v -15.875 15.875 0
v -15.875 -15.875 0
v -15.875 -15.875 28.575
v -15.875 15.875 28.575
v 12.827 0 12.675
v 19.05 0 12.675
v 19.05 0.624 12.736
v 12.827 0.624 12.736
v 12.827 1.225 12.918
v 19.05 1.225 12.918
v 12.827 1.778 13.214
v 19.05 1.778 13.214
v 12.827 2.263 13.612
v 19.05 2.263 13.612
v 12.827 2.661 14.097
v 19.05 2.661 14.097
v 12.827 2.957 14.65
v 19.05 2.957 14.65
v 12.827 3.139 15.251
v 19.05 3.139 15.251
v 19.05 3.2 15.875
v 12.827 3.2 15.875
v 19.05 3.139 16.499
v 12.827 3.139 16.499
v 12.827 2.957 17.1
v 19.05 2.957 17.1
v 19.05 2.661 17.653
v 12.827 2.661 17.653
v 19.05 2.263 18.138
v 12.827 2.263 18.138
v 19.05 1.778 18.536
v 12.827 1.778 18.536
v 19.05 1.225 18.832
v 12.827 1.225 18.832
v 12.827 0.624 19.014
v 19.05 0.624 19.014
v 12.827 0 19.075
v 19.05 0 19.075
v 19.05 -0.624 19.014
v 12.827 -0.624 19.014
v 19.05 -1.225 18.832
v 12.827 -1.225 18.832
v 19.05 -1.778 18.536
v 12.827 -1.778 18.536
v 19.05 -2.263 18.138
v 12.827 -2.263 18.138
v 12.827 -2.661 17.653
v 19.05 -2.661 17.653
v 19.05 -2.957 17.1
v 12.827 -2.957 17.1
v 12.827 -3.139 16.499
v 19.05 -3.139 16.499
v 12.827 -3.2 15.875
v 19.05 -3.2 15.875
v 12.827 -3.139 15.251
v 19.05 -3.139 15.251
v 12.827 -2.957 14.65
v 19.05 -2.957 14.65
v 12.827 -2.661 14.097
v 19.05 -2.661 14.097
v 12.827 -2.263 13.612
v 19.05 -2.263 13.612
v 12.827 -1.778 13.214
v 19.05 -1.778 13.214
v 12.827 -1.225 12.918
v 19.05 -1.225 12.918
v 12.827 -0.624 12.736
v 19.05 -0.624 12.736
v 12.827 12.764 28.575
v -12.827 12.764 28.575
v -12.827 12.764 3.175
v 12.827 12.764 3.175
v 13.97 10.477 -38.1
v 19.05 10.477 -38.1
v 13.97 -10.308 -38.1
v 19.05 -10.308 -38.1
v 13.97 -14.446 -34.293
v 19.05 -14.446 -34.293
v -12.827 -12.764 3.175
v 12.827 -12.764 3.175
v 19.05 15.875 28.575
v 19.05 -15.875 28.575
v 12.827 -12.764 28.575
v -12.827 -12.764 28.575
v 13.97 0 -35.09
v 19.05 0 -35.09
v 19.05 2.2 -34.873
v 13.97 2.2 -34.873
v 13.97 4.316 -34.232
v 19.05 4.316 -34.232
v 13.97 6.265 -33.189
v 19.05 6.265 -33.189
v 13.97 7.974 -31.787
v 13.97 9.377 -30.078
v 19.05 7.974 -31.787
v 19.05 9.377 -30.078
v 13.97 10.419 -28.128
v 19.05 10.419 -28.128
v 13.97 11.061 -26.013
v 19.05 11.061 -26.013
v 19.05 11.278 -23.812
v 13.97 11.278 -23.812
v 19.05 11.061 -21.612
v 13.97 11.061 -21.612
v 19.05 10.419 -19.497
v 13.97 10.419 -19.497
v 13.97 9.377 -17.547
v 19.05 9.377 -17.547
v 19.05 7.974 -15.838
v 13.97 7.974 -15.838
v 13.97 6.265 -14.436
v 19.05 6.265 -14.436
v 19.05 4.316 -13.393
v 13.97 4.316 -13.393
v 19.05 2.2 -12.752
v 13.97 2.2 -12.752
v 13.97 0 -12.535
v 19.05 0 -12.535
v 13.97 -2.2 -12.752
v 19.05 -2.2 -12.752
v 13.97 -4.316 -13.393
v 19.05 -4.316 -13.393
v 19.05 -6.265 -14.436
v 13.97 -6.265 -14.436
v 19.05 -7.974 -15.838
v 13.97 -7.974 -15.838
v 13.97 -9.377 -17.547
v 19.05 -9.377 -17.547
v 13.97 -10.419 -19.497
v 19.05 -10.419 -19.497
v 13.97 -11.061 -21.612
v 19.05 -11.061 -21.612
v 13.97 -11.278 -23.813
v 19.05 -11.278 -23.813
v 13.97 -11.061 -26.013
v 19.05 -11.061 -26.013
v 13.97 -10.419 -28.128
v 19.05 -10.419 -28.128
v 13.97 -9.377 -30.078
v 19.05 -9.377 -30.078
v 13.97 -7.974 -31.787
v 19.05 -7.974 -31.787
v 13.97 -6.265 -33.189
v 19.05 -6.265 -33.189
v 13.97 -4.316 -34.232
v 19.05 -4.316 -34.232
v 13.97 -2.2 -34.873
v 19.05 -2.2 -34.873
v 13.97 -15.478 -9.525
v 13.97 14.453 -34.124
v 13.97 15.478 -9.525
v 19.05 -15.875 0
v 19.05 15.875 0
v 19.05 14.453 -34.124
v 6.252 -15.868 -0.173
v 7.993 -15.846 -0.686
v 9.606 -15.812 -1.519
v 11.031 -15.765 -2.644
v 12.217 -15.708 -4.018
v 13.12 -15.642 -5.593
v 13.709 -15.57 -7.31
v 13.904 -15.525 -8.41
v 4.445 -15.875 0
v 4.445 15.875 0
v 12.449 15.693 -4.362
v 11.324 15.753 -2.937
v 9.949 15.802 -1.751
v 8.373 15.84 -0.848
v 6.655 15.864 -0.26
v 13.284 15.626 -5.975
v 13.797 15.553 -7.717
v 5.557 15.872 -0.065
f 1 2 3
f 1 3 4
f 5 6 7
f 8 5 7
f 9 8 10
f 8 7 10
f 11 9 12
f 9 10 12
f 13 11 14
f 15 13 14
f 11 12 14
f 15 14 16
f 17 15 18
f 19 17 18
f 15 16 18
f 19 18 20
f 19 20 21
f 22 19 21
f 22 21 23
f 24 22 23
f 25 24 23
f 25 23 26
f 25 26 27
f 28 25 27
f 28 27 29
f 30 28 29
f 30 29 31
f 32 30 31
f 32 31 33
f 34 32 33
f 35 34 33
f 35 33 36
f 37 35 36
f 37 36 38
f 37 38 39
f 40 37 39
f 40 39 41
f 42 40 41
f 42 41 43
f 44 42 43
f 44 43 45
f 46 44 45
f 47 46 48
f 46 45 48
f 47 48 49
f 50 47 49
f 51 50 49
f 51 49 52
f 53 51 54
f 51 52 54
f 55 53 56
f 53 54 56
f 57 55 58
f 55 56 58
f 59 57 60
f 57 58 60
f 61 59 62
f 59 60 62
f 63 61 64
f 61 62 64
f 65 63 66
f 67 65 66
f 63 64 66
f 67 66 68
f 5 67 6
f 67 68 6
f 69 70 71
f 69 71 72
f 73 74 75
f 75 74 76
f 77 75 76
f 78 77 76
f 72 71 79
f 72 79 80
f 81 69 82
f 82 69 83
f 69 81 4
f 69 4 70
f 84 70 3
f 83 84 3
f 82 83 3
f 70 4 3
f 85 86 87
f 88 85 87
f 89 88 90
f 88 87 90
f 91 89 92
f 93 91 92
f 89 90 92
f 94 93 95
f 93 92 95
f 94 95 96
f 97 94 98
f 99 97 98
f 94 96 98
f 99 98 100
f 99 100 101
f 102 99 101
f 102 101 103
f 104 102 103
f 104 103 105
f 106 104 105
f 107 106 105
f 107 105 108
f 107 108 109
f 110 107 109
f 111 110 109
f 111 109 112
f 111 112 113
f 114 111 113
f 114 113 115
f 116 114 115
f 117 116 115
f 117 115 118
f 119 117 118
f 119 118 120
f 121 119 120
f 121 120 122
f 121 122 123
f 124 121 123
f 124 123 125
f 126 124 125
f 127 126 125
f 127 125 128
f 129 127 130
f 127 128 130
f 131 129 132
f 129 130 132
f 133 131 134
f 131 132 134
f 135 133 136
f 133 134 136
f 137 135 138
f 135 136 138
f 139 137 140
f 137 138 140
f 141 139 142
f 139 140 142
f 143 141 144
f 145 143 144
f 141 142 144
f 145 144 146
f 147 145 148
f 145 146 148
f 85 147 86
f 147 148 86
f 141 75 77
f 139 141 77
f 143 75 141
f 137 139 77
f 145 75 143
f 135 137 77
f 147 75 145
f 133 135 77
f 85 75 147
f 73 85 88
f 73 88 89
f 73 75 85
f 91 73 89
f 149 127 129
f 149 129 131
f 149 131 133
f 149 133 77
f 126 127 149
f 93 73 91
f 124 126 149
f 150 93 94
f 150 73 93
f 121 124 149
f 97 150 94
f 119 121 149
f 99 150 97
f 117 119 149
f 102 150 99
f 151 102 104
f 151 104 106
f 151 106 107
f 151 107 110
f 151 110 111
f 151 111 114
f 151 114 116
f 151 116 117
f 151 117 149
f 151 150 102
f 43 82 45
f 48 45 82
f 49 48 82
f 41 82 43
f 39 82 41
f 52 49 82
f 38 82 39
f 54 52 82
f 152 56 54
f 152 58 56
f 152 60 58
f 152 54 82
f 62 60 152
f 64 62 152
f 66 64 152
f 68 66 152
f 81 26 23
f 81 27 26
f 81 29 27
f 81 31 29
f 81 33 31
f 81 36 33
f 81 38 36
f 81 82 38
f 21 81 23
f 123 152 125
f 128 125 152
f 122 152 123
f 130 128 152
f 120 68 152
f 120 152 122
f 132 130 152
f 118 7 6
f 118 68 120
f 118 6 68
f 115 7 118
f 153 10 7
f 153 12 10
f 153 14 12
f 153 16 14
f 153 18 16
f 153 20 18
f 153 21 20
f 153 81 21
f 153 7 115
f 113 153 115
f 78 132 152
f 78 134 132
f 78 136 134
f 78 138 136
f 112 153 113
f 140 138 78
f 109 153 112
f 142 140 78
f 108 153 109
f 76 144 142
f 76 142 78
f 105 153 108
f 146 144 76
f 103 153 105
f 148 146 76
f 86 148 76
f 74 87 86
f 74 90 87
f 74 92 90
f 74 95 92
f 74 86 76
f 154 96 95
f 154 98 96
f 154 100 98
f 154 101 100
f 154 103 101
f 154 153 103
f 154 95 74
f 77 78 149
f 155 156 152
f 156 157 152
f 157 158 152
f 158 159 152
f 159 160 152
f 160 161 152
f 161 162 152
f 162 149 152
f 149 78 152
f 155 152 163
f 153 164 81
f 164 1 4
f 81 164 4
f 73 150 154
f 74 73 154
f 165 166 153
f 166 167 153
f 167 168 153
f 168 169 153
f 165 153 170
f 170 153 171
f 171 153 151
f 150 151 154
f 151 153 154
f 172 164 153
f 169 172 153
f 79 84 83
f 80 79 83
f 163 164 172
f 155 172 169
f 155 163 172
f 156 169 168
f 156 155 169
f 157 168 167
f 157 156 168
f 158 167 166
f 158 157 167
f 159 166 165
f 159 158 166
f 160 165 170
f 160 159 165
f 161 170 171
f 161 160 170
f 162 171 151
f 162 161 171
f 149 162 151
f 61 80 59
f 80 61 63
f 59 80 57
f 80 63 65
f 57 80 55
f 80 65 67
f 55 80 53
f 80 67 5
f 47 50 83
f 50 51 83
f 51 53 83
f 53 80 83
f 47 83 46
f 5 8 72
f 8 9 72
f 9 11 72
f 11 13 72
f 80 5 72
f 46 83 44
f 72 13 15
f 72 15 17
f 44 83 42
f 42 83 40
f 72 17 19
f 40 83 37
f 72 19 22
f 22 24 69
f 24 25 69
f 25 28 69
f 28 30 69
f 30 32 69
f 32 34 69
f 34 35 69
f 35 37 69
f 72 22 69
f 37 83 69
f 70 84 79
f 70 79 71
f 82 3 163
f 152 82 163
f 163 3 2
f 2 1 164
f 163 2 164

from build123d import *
from OCP.BRepFilletAPI import BRepFilletAPI_MakeChamfer

# Parameters (mm, degrees)
SKETCH1_W           = 31.75
SKETCH1_H           = 31.75
BOSS_EXTRUDE1_DEPTH = 28.575
SKETCH2_W           = 25.654
SKETCH2_H           = 25.527
CUT_EXTRUDE1_DEPTH  = 25.4
BOSS_EXTRUDE2_DEPTH = 3.175
BOSS_EXTRUDE3_DEPTH = 1.905
FILLET1_R           = 9.525
CUT_EXTRUDE2_REACH  = 56.068
SKETCH6_R           = 11.2776
SKETCH6_R_2         = 3.2004
CHAMFER1_SIZE       = 3.81
CHAMFER1_SIZE2      = 3.979101764


with BuildPart() as part:
    # Sketch1 → Boss-Extrude1 (new body)
    with BuildSketch(Plane.XY):
        Rectangle(SKETCH1_W, SKETCH1_H)
    extrude(amount=BOSS_EXTRUDE1_DEPTH)

    # Sketch2 → Cut-Extrude1 (cut)
    with BuildSketch(Plane.XY.offset(28.575)):
        Rectangle(SKETCH2_W, SKETCH2_H)
    extrude(amount=-CUT_EXTRUDE1_DEPTH, mode=Mode.SUBTRACT)

    # Sketch4 → Boss-Extrude2 (add)
    with BuildSketch(Plane(origin=(15.875, 0, 0), x_dir=(0, 0, -1), z_dir=(1, 0, 0))):
        Polygon((-28.575, -15.875), (0, -15.875), (38.1, -14.2875), (38.1, 14.2875), (0, 15.875), (-28.575, 15.875), align=None)
    extrude(amount=BOSS_EXTRUDE2_DEPTH)

    # Sketch5 → Boss-Extrude3 (add)
    with BuildSketch(Plane.ZY.offset(-15.875)):
        Polygon((-38.1, -14.2875), (0, -15.875), (0, 15.875), (-38.1, 14.2875), align=None)
    extrude(amount=BOSS_EXTRUDE3_DEPTH)

    # Fillet1
    # the kernel refuses this fillet: 9.525 mm, written as the material it adds along each edge
    with BuildSketch(Plane(origin=(13.97, -15.875, 0), x_dir=(-1, 0, 0), z_dir=(0, 1, 0))) as fillet1_piece_1_section:
        with BuildLine():
            CenterArc((FILLET1_R, -FILLET1_R), FILLET1_R, 90, 90)
            Line((0, -FILLET1_R), (0, 0))
            Line((0, 0), (FILLET1_R, 0))
        make_face()
    fillet1_piece_1 = extrude(amount=31.75, mode=Mode.PRIVATE)
    fillet1_piece_1 = split(fillet1_piece_1, bisect_by=Plane(origin=(11.807061563, -15.758253216, -2.801922808), z_dir=(0, 0.999133073092352, 0.04163054471218078)), keep=Keep.TOP, mode=Mode.PRIVATE)
    fillet1_piece_1 = split(fillet1_piece_1, bisect_by=Plane(origin=(11.807061563, 15.758253216, -2.801922808), z_dir=(0, -0.9991330730923519, 0.041630544712181895)), keep=Keep.TOP, mode=Mode.PRIVATE)
    add(fillet1_piece_1)

    # Sketch6 → Cut-Extrude2 (cut, up to next)
    with BuildSketch(Plane(origin=(19.05, 0, 0), x_dir=(0, 0, -1), z_dir=(1, 0, 0)), mode=Mode.PRIVATE) as cut_extrude2_sk1:
        with Locations((23.8125, 0)):
            Circle(SKETCH6_R)
    cut_extrude2_tool1 = extrude(cut_extrude2_sk1.sketch, amount=-CUT_EXTRUDE2_REACH, mode=Mode.PRIVATE) & part.part
    # Sketch6 → Cut-Extrude2 (cut, up to next)
    with BuildSketch(Plane(origin=(19.05, 0, 0), x_dir=(0, 0, -1), z_dir=(1, 0, 0)), mode=Mode.PRIVATE) as cut_extrude2_sk2:
        with Locations((-15.875, 0)):
            Circle(SKETCH6_R_2)
    cut_extrude2_tool2 = extrude(cut_extrude2_sk2.sketch, amount=-CUT_EXTRUDE2_REACH, mode=Mode.PRIVATE) & part.part
    add(cut_extrude2_tool1.solids().sort_by_distance((19.05, 0, -23.8125))[0], mode=Mode.SUBTRACT)
    add(cut_extrude2_tool2.solids().sort_by_distance((19.05, 0, 15.875))[0], mode=Mode.SUBTRACT)

    # Chamfer1: one chamfer whose edges measure the first distance from different faces: ONE call of the kernel's chamfer builder (chamfer() names one face for all edges)
    chamfer1_edges_1 = [part.edges().sort_by_distance(p)[0] for p in [
        (16.51, -14.2875, -38.1),
    ]]
    chamfer1_side_1 = [part.faces().sort_by_distance(p)[0] for p in [
        (16.083382106, -15.145696386, -17.503286726),
    ]]
    chamfer1_edges_2 = [part.edges().sort_by_distance(p)[0] for p in [
        (16.51, 14.2875, -38.1),
    ]]
    chamfer1_side_2 = [part.faces().sort_by_distance(p)[0] for p in [
        (16.51, 0, -38.1),
    ]]
    chamfer1 = BRepFilletAPI_MakeChamfer(part.part.solid().wrapped)
    for e in chamfer1_edges_1:
        chamfer1.Add(CHAMFER1_SIZE, CHAMFER1_SIZE2, e.wrapped, chamfer1_side_1[0].wrapped)  # the first distance lies on this face
    for e in chamfer1_edges_2:
        chamfer1.Add(CHAMFER1_SIZE, CHAMFER1_SIZE2, e.wrapped, chamfer1_side_2[0].wrapped)  # the first distance lies on this face
    add(Compound.cast(chamfer1.Shape()), mode=Mode.REPLACE)


solid = part.part
